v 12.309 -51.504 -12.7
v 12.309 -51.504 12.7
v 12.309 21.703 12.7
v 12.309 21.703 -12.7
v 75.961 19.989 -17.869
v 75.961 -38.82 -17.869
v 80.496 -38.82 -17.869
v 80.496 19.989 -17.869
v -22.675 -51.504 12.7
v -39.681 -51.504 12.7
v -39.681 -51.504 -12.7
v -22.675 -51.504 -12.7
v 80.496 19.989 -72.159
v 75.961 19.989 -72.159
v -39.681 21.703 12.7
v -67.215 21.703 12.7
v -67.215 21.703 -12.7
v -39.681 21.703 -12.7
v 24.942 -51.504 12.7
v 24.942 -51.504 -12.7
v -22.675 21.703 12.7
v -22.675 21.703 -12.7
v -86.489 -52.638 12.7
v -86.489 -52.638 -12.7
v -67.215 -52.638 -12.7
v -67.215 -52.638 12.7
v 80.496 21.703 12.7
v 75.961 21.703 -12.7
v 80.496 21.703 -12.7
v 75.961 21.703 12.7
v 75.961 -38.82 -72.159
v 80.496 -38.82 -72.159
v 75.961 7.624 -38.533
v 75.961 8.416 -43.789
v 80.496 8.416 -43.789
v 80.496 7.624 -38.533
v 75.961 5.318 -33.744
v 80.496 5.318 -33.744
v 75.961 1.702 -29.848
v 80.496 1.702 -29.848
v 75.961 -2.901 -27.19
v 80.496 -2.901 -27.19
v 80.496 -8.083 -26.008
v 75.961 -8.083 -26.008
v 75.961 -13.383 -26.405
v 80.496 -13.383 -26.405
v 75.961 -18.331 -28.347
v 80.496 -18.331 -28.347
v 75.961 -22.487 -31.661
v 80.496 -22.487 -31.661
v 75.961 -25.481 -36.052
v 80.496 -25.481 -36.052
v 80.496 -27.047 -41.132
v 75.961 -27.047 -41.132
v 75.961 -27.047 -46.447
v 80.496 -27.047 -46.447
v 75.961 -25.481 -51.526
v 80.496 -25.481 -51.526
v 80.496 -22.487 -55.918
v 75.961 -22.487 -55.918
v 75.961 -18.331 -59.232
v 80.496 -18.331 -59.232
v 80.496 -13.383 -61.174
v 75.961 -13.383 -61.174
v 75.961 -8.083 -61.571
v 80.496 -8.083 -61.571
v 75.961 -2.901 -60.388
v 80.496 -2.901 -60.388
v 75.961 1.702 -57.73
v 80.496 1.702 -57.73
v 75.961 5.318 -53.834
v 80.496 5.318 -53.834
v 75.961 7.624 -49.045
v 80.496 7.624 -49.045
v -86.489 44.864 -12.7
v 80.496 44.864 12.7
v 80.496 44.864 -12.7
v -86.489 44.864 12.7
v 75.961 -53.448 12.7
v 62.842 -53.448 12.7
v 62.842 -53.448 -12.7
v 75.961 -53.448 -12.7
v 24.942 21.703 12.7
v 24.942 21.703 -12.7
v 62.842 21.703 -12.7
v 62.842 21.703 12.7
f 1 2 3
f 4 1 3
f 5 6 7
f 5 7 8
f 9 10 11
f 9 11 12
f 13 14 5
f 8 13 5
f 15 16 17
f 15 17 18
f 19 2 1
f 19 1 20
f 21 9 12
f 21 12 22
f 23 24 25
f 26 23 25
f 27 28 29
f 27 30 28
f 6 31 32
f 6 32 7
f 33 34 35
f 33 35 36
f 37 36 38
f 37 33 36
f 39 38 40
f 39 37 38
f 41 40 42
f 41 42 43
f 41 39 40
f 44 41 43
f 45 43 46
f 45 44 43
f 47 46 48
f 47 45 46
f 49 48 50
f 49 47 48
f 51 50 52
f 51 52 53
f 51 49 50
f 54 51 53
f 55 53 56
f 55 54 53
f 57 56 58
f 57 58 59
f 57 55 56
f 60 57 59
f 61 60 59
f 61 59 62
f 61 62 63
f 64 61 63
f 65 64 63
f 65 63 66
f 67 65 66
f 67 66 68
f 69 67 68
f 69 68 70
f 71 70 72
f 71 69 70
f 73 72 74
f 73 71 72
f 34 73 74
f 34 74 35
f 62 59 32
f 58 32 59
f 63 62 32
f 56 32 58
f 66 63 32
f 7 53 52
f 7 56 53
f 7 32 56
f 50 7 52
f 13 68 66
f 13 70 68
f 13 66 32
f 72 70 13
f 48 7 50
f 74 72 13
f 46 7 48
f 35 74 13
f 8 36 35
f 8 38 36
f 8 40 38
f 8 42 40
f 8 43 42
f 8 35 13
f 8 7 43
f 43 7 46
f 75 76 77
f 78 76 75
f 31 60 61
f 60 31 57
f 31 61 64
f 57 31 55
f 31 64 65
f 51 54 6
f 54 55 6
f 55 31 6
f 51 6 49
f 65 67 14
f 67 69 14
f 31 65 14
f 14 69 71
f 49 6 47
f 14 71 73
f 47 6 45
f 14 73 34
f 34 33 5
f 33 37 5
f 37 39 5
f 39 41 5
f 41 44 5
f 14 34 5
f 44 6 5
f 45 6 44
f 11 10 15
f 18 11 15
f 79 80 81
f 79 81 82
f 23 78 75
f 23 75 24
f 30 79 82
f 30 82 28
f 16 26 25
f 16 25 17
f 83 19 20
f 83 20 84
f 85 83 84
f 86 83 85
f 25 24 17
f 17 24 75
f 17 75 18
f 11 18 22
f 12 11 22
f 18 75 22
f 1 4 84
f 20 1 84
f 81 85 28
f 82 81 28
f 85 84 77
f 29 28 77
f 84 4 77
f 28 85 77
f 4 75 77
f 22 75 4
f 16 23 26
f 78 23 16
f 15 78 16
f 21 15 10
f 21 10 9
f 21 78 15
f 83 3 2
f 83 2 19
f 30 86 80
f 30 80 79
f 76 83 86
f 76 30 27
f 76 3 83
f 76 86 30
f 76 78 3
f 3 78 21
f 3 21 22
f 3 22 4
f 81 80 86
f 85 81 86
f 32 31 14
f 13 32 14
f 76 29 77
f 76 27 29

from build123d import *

# Parameters (mm, degrees)
F0_W     = 19.2736685276
F0_H     = 74.3412747979
F0_W_2   = 13.1190568209
F0_H_2   = 75.1510933042
F0_W_3   = 17.0061737299
F0_H_3   = 73.2075273991
F0_W_4   = 12.633157894
F2_DEPTH = 12.7
F3_START = 75.960919261
F1_W     = 58.8091406971
F1_H     = 54.2895048857
F1_R     = 17.8313793546
F3_DEPTH = 4.5349746943


with BuildPart() as f2:
    # F0 (on Top) → F2 (new body, symmetric)
    with BuildSketch(Plane.XY):
        Polygon((80.4958939552, 44.8639057577), (-86.4885449409, 44.8639057577), (-86.4885449409, 21.7031165957), (-67.2148764133, 21.7031165957), (-39.6810732782, 21.7031165957), (-22.6748995483, 21.7031165957), (12.309230864, 21.7031165957), (24.9423887581, 21.7031165957), (62.8418624401, 21.7031165957), (75.960919261, 21.7031165957), (80.4958939552, 21.7031165957), align=None)
        with Locations((-76.8517106771, -15.4675208032)):
            Rectangle(F0_W, F0_H)
        with Locations((69.4013908505, -15.8724300563)):
            Rectangle(F0_W_2, F0_H_2)
        with Locations((-31.1779864132, -14.9006471038)):
            Rectangle(F0_W_3, F0_H_3)
        with Locations((18.6258098111, -14.9006471038)):
            Rectangle(F0_W_4, F0_H_3)
    extrude(amount=F2_DEPTH, both=True)


with BuildPart() as f3:
    # F1 (on Right) → F3 (new body)
    with BuildSketch(Plane.YZ.offset(F3_START)):
        with Locations((-9.4152567908, -45.014180243)):
            Rectangle(F1_W, F1_H)
        with Locations((-9.4152567908, -43.7892191112)):
            Circle(F1_R, mode=Mode.SUBTRACT)
    extrude(amount=F3_DEPTH)


solid = Compound([f2.part, f3.part])
